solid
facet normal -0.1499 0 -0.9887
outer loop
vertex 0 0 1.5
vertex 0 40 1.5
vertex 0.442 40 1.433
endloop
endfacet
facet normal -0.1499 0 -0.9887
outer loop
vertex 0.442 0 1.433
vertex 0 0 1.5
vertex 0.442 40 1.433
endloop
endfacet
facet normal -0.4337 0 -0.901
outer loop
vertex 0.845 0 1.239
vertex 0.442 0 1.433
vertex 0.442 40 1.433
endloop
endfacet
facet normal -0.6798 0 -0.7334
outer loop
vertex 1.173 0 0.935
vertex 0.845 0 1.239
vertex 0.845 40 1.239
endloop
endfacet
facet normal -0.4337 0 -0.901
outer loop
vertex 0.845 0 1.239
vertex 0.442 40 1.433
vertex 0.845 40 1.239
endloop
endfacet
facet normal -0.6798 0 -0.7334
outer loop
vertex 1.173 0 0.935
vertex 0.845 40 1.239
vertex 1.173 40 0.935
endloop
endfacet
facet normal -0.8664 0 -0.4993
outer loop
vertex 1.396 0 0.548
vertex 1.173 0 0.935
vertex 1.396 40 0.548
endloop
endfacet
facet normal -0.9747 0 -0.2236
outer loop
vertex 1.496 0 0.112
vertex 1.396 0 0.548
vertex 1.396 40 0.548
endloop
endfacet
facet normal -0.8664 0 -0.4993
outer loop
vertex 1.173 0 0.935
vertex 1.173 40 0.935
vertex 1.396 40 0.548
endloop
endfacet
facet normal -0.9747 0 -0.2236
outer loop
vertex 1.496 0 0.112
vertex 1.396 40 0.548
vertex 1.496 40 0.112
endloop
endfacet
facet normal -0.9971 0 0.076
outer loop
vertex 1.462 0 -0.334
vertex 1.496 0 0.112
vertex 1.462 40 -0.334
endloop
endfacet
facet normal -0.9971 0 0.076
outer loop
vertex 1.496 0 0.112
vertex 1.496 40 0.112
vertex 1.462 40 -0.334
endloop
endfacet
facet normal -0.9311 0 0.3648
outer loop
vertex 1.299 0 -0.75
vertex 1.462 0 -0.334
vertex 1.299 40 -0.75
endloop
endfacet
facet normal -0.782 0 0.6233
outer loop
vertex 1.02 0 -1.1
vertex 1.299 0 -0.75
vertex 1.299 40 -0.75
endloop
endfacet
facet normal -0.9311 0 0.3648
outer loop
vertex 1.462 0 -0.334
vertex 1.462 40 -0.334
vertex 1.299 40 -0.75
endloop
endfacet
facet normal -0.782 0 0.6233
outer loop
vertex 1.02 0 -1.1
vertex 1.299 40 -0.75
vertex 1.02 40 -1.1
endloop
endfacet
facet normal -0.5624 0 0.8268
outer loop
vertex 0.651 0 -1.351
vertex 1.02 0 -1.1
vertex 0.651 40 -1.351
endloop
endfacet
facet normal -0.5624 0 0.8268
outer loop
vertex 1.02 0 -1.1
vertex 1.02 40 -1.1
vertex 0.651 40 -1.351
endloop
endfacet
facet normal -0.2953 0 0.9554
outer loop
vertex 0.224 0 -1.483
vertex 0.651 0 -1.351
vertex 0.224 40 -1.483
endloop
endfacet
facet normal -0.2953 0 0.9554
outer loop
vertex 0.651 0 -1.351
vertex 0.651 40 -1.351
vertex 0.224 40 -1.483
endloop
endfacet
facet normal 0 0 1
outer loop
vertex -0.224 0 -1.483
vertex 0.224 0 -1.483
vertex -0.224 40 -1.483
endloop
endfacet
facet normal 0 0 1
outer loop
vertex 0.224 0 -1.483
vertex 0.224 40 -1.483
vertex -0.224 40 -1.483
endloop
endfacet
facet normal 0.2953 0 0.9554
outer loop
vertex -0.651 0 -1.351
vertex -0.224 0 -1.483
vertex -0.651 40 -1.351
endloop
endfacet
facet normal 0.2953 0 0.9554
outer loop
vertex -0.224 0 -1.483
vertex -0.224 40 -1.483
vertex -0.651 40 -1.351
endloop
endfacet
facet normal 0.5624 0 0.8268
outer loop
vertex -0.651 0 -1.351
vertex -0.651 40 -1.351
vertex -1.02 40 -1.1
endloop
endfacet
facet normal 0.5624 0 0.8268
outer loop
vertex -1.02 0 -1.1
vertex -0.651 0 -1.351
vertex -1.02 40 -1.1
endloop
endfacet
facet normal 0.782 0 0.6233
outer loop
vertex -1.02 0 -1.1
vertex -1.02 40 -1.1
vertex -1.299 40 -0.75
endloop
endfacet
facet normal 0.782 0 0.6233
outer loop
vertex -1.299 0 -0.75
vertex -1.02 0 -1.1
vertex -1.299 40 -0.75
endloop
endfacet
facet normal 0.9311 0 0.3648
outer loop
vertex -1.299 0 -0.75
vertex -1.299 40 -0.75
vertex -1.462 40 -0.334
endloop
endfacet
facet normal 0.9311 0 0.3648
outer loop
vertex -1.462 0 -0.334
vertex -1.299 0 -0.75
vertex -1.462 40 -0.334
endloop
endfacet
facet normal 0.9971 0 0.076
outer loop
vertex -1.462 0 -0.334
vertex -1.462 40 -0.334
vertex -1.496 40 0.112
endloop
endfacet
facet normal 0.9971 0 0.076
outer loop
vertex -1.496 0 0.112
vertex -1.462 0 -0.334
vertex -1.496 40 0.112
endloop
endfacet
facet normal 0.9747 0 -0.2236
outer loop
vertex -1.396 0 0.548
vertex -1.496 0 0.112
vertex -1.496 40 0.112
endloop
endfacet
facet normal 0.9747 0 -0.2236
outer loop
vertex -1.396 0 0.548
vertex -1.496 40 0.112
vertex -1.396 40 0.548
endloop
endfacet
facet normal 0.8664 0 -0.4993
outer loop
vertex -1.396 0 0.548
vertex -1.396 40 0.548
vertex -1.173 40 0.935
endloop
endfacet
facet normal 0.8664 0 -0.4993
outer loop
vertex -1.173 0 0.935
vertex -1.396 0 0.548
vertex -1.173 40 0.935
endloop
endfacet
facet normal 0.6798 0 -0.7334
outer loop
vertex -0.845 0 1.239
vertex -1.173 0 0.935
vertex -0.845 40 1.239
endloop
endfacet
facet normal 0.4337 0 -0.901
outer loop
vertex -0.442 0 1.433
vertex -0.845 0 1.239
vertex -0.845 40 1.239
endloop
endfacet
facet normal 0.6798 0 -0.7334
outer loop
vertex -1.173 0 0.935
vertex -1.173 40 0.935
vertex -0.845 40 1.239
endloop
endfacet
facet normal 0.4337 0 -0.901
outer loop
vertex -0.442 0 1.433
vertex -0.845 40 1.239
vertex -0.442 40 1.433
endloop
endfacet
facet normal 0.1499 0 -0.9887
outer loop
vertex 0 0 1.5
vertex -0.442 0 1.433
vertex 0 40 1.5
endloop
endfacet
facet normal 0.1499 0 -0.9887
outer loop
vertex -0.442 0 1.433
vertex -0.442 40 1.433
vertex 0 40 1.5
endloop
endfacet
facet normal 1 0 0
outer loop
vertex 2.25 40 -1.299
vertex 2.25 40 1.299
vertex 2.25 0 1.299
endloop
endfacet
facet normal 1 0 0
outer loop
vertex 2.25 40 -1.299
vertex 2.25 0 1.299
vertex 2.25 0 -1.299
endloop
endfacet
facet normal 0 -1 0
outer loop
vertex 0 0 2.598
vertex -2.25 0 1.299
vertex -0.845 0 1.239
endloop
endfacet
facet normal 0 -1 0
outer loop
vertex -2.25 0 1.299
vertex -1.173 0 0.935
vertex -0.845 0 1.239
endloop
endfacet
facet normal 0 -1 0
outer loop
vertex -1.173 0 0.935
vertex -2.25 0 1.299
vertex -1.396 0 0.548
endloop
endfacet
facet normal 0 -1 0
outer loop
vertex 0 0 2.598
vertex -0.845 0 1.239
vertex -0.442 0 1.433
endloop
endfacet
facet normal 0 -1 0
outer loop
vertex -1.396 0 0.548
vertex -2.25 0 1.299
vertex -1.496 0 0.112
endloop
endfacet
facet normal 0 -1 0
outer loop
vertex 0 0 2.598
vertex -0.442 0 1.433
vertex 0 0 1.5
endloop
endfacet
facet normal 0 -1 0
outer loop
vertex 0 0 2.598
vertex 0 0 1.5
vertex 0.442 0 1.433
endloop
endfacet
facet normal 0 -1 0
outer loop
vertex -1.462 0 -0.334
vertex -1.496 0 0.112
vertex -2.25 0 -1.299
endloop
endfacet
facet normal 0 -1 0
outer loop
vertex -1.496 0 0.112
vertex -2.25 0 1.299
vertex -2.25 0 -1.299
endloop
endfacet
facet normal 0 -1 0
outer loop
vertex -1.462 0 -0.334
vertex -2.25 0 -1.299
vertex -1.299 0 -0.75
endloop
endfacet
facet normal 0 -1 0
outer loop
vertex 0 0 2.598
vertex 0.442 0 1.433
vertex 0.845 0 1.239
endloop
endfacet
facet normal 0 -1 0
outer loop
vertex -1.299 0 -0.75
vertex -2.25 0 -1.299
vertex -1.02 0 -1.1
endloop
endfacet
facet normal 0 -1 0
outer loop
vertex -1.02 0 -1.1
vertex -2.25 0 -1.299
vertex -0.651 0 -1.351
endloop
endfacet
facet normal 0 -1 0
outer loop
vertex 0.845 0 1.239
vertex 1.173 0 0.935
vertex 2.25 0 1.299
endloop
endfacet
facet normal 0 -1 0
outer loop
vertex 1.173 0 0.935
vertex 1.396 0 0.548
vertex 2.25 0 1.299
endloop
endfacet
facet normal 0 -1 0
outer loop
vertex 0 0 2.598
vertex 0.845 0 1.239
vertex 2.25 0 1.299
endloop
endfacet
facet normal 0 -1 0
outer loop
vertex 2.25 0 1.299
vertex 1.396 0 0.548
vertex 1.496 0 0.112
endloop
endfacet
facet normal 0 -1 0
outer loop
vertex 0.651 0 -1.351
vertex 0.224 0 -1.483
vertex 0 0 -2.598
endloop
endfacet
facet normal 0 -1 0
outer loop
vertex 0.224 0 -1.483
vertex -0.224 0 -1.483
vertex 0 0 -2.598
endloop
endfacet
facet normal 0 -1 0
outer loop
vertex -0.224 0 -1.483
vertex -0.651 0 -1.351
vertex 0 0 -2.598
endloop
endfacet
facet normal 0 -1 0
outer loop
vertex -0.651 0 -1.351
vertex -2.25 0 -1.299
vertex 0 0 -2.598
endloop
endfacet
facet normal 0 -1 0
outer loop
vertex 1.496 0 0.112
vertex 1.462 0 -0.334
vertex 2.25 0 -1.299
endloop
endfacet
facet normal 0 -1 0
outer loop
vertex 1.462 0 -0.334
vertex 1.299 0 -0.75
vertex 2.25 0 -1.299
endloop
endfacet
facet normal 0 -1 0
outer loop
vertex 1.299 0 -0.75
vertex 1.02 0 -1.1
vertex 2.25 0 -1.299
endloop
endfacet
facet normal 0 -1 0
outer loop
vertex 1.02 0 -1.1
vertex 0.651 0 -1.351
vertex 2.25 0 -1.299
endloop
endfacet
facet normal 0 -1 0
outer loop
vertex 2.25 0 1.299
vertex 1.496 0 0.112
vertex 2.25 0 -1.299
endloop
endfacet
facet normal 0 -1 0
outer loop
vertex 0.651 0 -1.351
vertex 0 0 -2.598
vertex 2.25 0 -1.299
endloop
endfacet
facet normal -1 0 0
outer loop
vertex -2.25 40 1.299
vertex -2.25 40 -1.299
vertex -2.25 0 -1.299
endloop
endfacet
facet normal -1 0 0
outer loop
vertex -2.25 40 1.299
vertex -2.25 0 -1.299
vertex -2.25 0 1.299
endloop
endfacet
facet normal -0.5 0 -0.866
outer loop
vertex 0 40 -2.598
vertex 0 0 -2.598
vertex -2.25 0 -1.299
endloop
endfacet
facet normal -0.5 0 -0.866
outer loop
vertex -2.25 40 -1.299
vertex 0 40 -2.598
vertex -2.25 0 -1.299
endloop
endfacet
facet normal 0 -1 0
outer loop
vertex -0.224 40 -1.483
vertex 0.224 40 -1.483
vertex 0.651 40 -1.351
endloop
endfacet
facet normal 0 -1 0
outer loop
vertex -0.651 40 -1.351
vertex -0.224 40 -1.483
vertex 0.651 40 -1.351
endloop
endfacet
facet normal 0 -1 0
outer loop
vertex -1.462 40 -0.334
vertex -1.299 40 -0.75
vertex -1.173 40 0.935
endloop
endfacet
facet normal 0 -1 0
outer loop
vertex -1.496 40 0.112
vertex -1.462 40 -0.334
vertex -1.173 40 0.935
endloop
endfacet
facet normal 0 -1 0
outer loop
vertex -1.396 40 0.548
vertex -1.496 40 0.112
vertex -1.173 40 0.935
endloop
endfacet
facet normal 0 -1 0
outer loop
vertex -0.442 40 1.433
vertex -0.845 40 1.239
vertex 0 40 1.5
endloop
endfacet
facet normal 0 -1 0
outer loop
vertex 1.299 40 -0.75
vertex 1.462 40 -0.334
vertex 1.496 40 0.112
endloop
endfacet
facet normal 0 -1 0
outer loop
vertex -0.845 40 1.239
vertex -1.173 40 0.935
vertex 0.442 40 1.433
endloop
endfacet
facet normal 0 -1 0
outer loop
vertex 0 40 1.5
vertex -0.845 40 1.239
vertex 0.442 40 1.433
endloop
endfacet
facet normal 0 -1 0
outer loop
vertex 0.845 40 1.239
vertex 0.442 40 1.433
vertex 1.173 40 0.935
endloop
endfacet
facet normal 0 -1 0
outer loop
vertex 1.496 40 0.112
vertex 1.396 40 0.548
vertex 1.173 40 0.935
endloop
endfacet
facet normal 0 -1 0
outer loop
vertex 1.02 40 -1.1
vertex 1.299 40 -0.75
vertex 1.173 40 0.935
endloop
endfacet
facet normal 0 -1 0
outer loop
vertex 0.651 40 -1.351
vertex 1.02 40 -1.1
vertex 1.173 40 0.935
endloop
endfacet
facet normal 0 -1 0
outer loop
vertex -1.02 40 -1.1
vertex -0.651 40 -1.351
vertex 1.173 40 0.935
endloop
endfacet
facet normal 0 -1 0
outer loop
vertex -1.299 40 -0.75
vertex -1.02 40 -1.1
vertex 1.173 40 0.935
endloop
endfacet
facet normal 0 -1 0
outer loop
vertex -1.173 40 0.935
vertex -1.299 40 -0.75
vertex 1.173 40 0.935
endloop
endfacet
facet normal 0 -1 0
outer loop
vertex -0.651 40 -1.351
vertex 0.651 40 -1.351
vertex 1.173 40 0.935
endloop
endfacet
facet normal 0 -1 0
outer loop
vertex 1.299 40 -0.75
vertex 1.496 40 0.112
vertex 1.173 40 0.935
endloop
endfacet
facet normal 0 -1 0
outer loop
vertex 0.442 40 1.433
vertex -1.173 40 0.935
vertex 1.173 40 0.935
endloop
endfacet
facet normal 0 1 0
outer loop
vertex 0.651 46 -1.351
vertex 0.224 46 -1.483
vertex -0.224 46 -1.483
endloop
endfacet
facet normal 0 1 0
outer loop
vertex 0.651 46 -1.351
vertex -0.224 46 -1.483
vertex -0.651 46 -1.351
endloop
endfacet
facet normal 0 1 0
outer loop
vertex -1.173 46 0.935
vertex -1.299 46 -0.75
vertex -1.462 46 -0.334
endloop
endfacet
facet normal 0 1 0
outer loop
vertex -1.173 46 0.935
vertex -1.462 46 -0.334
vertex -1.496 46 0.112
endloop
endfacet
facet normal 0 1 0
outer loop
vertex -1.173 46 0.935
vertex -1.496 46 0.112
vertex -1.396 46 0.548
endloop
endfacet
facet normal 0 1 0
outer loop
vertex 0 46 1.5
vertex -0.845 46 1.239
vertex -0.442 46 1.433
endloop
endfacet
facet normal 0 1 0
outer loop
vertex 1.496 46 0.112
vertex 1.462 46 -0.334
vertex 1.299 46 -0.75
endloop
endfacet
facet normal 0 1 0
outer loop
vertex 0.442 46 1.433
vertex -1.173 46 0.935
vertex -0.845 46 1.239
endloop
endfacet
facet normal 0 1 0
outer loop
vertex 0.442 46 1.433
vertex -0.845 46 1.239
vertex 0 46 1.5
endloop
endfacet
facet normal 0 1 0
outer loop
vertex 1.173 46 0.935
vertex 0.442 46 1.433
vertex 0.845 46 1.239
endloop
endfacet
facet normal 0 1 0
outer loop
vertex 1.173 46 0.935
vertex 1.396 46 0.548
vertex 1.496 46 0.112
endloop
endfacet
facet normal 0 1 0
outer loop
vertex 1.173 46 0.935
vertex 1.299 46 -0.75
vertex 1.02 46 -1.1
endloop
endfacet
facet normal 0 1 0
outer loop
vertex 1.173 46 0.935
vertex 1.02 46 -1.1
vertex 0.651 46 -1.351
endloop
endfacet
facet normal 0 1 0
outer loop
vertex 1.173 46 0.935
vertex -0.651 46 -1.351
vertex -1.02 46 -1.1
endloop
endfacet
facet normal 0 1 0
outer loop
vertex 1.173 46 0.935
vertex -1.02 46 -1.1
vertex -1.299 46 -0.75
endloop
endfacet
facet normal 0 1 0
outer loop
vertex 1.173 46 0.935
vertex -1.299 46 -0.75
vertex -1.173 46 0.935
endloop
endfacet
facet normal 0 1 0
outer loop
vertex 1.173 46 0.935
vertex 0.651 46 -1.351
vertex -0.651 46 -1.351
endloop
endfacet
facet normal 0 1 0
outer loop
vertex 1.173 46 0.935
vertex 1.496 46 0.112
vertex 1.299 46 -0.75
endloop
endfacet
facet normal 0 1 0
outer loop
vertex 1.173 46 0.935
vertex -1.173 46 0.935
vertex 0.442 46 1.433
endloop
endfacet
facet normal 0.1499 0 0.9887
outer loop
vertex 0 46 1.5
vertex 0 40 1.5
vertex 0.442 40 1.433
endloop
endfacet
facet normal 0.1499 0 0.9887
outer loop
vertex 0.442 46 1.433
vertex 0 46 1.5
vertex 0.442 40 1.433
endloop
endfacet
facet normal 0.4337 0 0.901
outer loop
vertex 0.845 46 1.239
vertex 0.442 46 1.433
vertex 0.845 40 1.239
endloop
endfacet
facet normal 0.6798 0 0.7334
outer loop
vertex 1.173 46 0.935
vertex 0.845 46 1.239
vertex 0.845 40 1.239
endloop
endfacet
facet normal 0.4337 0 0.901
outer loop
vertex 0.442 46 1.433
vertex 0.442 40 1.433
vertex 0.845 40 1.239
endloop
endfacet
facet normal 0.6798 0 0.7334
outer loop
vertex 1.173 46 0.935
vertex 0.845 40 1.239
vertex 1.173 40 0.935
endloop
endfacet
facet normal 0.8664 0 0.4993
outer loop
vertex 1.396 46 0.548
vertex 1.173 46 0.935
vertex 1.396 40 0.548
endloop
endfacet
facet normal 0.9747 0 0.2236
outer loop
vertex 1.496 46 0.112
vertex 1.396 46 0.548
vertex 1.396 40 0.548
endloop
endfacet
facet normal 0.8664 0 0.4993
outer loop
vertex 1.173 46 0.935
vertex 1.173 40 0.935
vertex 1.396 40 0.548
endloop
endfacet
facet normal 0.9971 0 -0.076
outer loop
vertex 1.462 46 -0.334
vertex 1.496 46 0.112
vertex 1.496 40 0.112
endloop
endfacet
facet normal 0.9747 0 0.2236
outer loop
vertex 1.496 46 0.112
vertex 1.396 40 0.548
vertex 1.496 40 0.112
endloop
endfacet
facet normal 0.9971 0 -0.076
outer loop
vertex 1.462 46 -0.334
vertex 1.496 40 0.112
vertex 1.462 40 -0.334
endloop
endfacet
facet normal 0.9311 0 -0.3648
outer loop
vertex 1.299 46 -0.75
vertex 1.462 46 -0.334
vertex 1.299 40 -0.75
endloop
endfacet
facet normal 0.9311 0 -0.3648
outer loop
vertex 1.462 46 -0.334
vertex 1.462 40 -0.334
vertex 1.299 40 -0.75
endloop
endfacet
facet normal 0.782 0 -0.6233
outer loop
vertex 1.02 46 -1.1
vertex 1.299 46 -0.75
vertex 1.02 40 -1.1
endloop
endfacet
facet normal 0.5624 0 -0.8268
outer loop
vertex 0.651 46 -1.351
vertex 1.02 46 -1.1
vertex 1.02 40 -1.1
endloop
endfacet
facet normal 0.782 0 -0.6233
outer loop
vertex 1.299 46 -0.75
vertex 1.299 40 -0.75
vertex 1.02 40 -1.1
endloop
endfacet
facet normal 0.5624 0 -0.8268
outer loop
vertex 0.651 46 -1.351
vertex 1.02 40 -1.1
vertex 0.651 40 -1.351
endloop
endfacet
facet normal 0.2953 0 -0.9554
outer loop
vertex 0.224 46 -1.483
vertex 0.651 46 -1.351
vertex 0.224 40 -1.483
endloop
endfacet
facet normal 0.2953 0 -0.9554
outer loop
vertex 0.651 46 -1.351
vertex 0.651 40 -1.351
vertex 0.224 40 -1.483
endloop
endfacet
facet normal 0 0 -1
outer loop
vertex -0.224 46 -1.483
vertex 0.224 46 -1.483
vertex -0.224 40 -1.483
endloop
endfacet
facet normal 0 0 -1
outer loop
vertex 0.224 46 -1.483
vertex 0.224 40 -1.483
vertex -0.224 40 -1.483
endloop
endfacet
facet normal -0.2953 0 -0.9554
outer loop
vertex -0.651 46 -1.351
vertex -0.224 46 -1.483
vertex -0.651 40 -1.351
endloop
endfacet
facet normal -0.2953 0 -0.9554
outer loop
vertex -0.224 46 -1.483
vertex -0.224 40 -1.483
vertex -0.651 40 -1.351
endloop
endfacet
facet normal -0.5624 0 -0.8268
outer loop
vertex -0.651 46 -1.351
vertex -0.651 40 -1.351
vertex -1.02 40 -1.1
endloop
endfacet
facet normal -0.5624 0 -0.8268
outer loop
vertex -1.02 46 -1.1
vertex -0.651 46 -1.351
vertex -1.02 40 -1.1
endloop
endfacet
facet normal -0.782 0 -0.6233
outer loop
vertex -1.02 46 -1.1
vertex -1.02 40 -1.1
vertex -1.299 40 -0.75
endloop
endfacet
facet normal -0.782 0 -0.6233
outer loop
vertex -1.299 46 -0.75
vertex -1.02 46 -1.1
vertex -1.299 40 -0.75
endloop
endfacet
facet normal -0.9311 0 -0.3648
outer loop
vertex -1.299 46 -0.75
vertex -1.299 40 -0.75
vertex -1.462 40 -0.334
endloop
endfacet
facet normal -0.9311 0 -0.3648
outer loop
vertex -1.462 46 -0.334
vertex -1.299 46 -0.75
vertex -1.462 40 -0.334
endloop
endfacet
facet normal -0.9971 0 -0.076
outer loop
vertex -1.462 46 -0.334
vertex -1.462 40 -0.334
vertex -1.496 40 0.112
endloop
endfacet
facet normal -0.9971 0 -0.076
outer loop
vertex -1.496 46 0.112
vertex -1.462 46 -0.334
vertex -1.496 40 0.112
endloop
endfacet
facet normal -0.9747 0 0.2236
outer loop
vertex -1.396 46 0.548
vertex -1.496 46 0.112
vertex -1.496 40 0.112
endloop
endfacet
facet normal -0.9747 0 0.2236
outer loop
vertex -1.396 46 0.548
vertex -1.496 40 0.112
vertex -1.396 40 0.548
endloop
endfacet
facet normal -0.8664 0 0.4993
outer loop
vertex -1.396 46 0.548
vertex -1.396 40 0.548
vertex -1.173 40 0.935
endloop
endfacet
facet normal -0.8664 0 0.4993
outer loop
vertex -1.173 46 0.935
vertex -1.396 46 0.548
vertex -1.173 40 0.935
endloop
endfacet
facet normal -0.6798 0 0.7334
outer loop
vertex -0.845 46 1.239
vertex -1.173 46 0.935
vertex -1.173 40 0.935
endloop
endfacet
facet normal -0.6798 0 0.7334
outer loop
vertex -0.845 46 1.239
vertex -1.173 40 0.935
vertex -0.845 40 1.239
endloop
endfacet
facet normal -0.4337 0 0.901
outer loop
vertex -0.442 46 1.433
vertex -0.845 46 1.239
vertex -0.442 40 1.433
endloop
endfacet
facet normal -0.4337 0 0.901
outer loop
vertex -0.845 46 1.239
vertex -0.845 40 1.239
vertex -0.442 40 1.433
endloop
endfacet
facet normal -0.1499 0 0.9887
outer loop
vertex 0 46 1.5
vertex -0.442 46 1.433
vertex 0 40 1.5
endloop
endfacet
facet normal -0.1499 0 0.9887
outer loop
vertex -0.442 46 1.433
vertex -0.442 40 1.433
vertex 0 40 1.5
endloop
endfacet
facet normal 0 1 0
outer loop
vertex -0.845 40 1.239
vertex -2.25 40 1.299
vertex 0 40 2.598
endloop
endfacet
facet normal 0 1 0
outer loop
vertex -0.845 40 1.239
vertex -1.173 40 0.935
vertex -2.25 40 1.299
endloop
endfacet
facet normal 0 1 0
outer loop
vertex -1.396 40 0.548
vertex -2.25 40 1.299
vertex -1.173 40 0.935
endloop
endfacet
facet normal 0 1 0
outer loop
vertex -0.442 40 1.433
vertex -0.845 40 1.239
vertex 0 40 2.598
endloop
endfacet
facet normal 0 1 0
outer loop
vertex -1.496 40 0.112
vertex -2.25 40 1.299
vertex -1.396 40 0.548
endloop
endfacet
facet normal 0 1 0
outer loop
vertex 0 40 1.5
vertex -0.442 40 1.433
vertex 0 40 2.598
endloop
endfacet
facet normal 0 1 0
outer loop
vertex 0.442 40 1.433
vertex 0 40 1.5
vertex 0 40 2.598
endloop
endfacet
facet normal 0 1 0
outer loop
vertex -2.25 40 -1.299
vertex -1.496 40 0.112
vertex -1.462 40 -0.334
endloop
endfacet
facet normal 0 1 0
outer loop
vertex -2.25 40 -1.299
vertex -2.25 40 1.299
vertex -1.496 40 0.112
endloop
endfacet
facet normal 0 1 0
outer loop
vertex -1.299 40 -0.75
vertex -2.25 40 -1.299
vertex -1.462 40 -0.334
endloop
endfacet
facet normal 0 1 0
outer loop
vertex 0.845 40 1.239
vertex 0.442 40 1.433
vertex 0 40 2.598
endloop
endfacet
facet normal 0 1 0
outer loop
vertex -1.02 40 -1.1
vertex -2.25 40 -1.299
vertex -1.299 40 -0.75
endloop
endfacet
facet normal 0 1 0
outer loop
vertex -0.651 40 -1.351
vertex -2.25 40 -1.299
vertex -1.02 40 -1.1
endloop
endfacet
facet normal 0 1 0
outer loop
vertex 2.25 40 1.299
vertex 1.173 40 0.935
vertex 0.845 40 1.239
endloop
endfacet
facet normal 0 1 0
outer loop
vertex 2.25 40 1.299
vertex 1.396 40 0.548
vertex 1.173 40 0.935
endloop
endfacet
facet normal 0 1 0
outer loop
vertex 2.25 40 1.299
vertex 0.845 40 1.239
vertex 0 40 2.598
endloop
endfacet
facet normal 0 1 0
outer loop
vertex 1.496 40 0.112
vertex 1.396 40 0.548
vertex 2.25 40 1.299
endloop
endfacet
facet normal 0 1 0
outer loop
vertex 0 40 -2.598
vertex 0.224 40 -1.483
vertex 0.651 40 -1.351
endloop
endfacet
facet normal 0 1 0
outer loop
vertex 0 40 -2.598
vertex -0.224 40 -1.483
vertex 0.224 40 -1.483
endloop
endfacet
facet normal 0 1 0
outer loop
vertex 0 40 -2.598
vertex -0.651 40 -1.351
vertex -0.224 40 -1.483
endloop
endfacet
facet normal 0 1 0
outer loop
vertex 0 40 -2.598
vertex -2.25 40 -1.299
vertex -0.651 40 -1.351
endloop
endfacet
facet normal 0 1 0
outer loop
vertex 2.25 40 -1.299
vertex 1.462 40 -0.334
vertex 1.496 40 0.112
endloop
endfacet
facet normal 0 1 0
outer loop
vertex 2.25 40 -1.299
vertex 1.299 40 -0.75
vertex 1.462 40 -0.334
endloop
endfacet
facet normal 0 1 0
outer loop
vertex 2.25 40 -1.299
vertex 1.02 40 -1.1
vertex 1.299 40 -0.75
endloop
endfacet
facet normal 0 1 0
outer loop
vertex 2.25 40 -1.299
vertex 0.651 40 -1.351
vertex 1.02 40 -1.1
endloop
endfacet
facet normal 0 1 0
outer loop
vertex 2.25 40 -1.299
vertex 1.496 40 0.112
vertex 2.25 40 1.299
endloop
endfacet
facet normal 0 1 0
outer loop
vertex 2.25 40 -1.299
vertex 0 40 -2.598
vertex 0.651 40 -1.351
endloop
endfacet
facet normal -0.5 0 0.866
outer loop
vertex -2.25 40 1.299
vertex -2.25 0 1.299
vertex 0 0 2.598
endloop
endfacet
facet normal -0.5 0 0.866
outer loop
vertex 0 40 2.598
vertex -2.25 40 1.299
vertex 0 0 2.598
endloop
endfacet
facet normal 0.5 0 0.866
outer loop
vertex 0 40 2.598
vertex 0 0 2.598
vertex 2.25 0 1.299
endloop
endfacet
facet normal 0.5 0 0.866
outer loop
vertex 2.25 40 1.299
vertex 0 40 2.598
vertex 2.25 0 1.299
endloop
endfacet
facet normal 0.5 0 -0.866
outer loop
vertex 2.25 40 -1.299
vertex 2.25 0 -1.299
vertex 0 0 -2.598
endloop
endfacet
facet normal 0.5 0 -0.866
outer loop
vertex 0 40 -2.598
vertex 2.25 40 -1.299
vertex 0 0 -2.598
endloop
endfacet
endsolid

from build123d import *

# Parameters (mm, degrees)
BOSS_EXTRUDE1_DEPTH = 40
SKETCH2_R           = 1.5
CUT_EXTRUDE1_DEPTH  = 40
SKETCH3_R           = 1.5
BOSS_EXTRUDE2_DEPTH = 6


with BuildPart() as part:
    # Sketch1 → Boss-Extrude1 (new body)
    with BuildSketch(Plane(origin=(0, 0, 0), x_dir=(1, 0, 0), z_dir=(0, 1, 0))):
        Polygon((0, 2.598076211), (-2.25, 1.299038106), (-2.25, -1.299038106), (0, -2.598076211), (2.25, -1.299038106), (2.25, 1.299038106), align=None)
    extrude(amount=BOSS_EXTRUDE1_DEPTH)

    # Sketch2 → Cut-Extrude1 (cut)
    with BuildSketch(Plane(origin=(0, 40, 0), x_dir=(1, 0, 0), z_dir=(0, 1, 0))):
        with Locations(Location((0, 0, 0), (0, 0, 270))):
            Circle(SKETCH2_R)
    extrude(amount=-CUT_EXTRUDE1_DEPTH, mode=Mode.SUBTRACT)


with BuildPart() as body_2:
    # Sketch3 → Boss-Extrude2 (new body)
    with BuildSketch(Plane(origin=(0, 40, 0), x_dir=(1, 0, 0), z_dir=(0, 1, 0))):
        with Locations(Location((0, 0, 0), (0, 0, 270))):
            Circle(SKETCH3_R)
    extrude(amount=BOSS_EXTRUDE2_DEPTH)


solid = Compound([part.part, body_2.part])
